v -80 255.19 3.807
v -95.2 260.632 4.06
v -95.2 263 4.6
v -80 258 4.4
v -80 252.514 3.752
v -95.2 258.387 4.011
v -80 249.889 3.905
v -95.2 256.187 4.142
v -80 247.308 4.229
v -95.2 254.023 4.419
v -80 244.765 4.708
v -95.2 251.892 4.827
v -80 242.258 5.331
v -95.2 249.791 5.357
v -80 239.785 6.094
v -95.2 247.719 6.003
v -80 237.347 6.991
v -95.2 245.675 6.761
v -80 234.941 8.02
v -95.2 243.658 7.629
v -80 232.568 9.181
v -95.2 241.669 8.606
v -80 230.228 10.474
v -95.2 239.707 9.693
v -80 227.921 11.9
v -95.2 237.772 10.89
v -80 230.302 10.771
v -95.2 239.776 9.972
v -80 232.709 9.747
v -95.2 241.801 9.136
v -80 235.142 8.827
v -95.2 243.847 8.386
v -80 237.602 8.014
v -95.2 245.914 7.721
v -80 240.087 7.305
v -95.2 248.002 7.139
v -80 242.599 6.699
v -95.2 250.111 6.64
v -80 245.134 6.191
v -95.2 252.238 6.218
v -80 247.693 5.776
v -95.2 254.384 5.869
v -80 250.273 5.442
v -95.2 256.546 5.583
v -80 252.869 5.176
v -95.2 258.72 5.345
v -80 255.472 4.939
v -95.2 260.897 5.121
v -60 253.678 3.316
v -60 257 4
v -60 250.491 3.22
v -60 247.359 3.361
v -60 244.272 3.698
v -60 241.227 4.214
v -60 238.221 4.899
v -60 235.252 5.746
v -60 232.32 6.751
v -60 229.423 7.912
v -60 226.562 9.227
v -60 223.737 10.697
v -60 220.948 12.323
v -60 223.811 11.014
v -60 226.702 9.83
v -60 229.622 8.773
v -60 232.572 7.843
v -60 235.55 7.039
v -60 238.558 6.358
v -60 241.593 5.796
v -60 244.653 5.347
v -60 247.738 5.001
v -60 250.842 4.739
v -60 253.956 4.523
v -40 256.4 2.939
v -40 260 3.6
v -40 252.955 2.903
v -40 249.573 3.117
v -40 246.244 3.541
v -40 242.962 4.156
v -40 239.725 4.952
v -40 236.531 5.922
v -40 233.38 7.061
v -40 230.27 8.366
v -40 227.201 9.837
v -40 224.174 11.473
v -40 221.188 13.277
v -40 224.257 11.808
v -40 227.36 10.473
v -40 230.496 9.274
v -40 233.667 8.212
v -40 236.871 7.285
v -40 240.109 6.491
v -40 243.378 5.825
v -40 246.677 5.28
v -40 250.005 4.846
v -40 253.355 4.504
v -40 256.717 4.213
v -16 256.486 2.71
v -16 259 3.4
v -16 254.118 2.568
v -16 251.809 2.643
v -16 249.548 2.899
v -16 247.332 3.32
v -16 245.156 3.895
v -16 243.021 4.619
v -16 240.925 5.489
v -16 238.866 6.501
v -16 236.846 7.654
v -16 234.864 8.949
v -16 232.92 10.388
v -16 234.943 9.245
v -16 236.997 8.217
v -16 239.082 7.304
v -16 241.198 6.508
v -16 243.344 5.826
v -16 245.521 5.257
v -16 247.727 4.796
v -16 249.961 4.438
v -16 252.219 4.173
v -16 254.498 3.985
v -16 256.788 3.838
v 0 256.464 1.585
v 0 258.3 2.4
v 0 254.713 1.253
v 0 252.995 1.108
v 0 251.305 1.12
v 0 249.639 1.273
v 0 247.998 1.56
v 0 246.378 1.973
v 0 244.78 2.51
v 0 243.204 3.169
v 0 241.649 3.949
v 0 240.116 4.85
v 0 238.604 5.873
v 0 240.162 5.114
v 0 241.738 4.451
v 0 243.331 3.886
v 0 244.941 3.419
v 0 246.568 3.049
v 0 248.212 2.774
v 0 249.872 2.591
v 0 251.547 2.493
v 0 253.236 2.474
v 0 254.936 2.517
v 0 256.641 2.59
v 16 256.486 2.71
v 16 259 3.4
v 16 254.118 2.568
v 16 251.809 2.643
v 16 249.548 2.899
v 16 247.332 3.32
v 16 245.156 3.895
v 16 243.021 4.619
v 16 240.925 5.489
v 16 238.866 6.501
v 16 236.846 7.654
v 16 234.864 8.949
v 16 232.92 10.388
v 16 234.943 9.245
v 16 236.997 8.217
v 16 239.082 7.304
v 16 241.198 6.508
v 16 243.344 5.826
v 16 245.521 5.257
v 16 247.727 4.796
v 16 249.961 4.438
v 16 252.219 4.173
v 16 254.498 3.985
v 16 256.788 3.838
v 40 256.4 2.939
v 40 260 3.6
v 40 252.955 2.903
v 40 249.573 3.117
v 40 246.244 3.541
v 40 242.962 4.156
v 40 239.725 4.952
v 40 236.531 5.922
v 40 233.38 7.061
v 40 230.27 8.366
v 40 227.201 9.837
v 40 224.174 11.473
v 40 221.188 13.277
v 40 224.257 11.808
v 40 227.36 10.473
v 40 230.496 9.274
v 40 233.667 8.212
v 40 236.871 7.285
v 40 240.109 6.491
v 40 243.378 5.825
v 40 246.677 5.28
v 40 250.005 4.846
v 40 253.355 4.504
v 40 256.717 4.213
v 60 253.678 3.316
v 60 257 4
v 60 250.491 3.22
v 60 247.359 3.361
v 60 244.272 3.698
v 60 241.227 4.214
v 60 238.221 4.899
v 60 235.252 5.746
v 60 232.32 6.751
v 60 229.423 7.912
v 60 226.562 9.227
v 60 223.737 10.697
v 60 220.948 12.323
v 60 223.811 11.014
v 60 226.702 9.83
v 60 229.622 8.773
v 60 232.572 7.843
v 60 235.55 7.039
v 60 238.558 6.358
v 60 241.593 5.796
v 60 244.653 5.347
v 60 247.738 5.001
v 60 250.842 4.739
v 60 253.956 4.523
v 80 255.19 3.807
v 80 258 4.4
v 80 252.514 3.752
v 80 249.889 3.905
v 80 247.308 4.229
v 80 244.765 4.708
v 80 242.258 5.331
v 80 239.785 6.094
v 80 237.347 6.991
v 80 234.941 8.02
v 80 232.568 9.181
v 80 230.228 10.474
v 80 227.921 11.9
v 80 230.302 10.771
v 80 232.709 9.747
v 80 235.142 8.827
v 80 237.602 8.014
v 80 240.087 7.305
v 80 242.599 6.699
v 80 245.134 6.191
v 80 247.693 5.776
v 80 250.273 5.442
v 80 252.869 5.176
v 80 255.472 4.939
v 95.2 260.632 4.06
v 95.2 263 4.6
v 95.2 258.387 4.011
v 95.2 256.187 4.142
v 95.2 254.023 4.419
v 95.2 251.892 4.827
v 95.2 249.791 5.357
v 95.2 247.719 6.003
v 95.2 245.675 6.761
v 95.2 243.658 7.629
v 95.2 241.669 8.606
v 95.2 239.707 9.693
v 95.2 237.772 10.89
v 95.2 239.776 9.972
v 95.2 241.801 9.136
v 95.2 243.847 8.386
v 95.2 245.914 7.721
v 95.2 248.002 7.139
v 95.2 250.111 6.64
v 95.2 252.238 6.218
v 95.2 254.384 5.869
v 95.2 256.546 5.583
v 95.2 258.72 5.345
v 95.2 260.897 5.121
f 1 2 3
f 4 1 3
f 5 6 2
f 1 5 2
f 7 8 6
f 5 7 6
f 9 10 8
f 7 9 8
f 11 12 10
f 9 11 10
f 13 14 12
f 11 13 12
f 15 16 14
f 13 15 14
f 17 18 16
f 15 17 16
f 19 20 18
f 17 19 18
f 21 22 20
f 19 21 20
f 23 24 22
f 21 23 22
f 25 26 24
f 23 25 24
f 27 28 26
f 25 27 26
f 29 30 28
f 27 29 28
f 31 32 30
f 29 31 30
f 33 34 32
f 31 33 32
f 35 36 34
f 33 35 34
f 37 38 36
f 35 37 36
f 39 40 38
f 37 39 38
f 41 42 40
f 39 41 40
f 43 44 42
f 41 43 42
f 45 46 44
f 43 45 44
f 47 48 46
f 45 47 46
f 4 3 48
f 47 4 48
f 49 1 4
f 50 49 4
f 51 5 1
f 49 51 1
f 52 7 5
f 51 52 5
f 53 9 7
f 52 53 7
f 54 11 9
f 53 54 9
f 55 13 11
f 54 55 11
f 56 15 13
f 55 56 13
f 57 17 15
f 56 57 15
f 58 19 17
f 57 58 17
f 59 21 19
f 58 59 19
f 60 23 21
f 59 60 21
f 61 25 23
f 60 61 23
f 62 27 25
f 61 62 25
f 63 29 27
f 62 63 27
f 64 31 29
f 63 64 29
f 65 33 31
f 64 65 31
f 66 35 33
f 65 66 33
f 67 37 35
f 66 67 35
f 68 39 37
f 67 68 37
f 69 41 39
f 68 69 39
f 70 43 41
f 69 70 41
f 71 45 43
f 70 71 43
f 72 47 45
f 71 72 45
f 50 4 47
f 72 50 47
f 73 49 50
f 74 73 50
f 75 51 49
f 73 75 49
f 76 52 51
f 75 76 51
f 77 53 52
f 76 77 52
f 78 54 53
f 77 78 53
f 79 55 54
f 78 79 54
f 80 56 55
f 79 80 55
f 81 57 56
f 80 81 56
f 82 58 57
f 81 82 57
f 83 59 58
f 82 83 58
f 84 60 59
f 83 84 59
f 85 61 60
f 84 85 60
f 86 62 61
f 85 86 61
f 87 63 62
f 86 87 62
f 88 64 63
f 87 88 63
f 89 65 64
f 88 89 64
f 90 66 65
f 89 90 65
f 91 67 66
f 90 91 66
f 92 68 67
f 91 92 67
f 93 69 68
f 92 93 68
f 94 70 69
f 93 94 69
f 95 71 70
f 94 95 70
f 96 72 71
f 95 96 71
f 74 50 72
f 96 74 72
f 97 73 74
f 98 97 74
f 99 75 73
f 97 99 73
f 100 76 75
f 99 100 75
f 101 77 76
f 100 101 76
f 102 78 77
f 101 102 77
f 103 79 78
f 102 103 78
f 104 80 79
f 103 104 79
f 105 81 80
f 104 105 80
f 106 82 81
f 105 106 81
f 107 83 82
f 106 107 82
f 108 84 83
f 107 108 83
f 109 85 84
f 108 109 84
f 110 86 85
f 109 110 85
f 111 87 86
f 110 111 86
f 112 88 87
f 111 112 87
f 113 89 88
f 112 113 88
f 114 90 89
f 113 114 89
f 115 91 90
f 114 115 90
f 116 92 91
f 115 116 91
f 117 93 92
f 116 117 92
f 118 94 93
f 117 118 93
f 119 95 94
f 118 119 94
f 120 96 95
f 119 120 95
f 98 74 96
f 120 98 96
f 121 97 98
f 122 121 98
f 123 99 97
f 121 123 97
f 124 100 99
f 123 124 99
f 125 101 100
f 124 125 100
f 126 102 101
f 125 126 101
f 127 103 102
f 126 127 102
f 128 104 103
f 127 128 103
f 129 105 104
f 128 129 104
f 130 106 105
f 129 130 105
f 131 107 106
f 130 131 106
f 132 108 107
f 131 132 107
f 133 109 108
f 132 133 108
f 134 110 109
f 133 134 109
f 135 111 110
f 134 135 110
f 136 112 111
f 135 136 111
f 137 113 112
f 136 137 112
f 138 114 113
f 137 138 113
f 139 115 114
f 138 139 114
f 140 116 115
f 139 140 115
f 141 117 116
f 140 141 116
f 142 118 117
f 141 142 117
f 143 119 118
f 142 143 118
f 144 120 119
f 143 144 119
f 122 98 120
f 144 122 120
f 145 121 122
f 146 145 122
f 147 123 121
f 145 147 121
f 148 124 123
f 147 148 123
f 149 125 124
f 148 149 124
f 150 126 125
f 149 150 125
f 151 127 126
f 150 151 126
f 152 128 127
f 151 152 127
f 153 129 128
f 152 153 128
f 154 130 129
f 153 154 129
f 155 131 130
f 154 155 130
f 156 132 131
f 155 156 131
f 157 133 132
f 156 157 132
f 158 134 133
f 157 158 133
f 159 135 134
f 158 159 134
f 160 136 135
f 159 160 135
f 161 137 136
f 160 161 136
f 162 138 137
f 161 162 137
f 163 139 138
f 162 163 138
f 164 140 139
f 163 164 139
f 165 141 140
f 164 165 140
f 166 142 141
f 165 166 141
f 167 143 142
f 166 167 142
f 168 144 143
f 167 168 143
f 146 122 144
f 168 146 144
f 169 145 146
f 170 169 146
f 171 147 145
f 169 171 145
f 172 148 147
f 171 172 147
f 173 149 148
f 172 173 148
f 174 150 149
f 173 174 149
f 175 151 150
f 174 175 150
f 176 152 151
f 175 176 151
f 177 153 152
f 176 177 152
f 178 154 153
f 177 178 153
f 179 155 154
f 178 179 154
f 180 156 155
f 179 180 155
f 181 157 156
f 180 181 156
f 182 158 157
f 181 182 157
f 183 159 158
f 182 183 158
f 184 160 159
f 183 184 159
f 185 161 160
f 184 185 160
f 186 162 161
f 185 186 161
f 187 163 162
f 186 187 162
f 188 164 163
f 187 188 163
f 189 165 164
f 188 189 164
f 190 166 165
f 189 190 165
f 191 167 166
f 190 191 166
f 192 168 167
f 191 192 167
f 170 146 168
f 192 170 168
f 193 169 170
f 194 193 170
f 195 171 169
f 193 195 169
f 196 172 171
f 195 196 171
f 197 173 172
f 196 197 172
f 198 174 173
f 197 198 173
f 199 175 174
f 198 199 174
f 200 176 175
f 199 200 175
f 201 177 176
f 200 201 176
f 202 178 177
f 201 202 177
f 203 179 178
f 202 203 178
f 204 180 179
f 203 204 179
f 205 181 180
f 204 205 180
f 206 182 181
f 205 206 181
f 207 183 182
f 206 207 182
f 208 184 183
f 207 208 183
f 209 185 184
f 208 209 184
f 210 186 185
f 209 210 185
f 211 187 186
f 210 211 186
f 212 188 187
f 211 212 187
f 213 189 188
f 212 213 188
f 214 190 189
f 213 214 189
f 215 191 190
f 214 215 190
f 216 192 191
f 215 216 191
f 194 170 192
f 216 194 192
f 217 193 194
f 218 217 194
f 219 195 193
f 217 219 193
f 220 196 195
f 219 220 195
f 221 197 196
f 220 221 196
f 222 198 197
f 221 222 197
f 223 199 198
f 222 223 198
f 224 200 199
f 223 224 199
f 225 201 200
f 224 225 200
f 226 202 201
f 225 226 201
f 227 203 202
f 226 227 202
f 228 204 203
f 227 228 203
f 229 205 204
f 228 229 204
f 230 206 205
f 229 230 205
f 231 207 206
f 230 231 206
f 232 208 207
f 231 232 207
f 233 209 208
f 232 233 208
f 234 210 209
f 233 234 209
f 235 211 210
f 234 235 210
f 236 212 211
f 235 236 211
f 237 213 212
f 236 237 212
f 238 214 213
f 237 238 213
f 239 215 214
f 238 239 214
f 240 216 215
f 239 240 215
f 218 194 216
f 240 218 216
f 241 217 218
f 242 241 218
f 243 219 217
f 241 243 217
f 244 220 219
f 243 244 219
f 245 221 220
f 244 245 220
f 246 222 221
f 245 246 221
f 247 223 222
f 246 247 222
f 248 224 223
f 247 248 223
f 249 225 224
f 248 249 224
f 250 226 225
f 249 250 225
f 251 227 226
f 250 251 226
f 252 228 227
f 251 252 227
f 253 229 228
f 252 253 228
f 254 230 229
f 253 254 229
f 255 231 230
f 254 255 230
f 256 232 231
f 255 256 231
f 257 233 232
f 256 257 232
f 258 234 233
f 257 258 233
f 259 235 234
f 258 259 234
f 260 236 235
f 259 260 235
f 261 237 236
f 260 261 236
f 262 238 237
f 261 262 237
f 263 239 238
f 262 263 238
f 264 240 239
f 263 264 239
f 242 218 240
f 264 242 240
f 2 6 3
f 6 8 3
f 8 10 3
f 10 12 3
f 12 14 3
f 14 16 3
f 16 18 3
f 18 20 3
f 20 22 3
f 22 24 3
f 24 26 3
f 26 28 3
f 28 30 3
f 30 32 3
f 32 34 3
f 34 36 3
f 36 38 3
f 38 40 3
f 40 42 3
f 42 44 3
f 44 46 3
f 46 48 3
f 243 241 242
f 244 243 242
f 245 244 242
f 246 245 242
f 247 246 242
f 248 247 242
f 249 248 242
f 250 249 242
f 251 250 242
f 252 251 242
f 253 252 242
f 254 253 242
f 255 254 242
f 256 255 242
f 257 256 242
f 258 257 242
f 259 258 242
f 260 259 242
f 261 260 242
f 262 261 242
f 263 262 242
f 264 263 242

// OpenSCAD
// file: ../lib.scad
// ===== 공용 프리미티브 (params 의존 없음 — use로 포함. 함정 1) =====

// 두 점을 잇는 캡슐. 끝단이 od/2 만큼 뻗는다 (함정 3)
module rod(p1, p2, od, fn = 56)
    hull() { translate(p1) sphere(d = od, $fn = fn);
             translate(p2) sphere(d = od, $fn = fn); }

function mir(p, s = 1) = [s * p.x, p.y, p.z];

// --- 라운디드 사각 2D 폴리곤 (CCW) ---
function arc_pt(cx, cy, r, a) = [cx + r * cos(a), cy + r * sin(a)];
function rrpts(w, h, r, n = 4) =
    let (x = w / 2 - r, y = h / 2 - r)
    concat(
        [for (i = [0:n]) arc_pt( x, -y, r, -90 + 90 * i / n)],
        [for (i = [0:n]) arc_pt( x,  y, r,   0 + 90 * i / n)],
        [for (i = [0:n]) arc_pt(-x,  y, r,  90 + 90 * i / n)],
        [for (i = [0:n]) arc_pt(-x, -y, r, 180 + 90 * i / n)]);

// y 위치의 XZ 단면 슬래브 (중심 x0/zc, 폭 w/높이 h, 모서리 r).
// 회전 매핑: 2D x→차량 X, 2D y→차량 Z, 돌출 +z→−Y (y..y+0.02 전방 전용, 함정 20)
module slabr(y, x0, w, h, zc, r)
    translate([x0, y + 0.02, zc]) rotate([90, 0, 0])
        linear_extrude(0.02) polygon(rrpts(w, h, r));

// 단면 체인 loft: sec = [[y, x0, w, h, zc, r], ...]
module loftr(sec)
    for (i = [0 : len(sec) - 2])
        hull() {
            slabr(sec[i][0],     sec[i][1],     sec[i][2],     sec[i][3],     sec[i][4],     sec[i][5]);
            slabr(sec[i + 1][0], sec[i + 1][1], sec[i + 1][2], sec[i + 1][3], sec[i + 1][4], sec[i + 1][5]);
        }

// 라운디드 박스 (z0..z1 수직, 평면 모서리 r)
module rbox(xc, yc, z0, z1, dx, dy, r, fn = 32)
    hull() for (px = [-1, 1], py = [-1, 1])
        translate([xc + px * (dx / 2 - r), yc + py * (dy / 2 - r), z0])
            cylinder(r = r, h = z1 - z0, $fn = fn);

// --- NACA 계열 에어포일 (LE 원점, 2D +x = 현 방향) ---
function _yt(x, c, t) = 5 * t * c * (0.2969*sqrt(x) - 0.1260*x - 0.3516*x*x
    + 0.2843*x*x*x - 0.1036*x*x*x*x);
function _yc(x, c, m) = 4 * m * c * x * (1 - x);
function naca_pts(c, t, m, n = 12) =
    concat(
        [for (i = [0:n])     let (x = i / n)     [x*c,  _yt(x, c, t) + _yc(x, c, m)]],
        [for (i = [n-1:-1:0]) let (x = i / n)    [x*c, -_yt(x, c, t) + _yc(x, c, m)]]);

// 슬라이스 3D 링: v=[x, yle, zle, c, aoa, th, cam] → 받각 회전된 naca 점의 링
// (th/cam은 mm — 현 대비 비율로 정규화)
function wring(v, n = 12) =
    let (c = v[3], t = v[5] / c, m = v[6] / c, pts = naca_pts(c, t, m, n),
         ca = cos(v[4]), sa = sin(v[4]))
    // 코드 방향 (ca,sa) + 두께/캠버 수직 방향 (-sa,ca) — 2D y 누락 금지
    [for (p = pts) [v[0], v[1] + p[0] * ca - p[1] * sa, v[2] + p[0] * sa + p[1] * ca]];

// 진짜 로프트 윙 — polyhedron 스트립. hull 체인은 캠버진 하면을 볼록 껍질로
// 채워(LE→TE 직선 웨지) 요소가 처지므로 쓰지 않는다
module wing3(sl, n = 12) {
    rings = [for (v = sl) wring(v, n)];
    ns = len(rings);
    m = len(rings[0]);
    pts = [for (r = rings, p = r) p];
    function ix(i, k) = i * m + (k % m);
    faces = concat(
        // 측면 스트립 (사중면 → 삼각형 2) — 외향 노멀 권선(캡과 일치)
        [for (i = [0 : ns - 2], k = [0 : m - 1])
            each [[ix(i, k), ix(i, k + 1), ix(i + 1, k + 1)],
                  [ix(i, k), ix(i + 1, k + 1), ix(i + 1, k)]]],
        // 끝 캡 (링은 단순 폴리곤 — 팬 삼각분할)
        [for (k = [1 : m - 2]) [ix(0, 0), ix(0, k + 1), ix(0, k)]],
        [for (k = [1 : m - 2]) [ix(ns - 1, 0), ix(ns - 1, k), ix(ns - 1, k + 1)]]
    );
    polyhedron(points = pts, faces = faces, convexity = 4);
}

// 반쪽 슬라이스 → x-대칭 전체. 규약: half는 센터(x=0)→팁 순서(내림차순 x).
// 결과는 x 오름차순 체인. x=0 센터만 중복 제외 (그 외 전부 미러)
function wsym(half) =
    concat([for (i = [len(half) - 1 : -1 : 0]) half[i]],
           [for (i = [0 : len(half) - 1]) if (abs(half[i][0]) > 1e-9)
               concat([-half[i][0]], [for (j = [1 : len(half[i]) - 1]) half[i][j]])]);

// 환(링), 축 Z
module ann(r_in, r_out, h, fn = 96)
    difference() { cylinder(r = r_out, h = h, center = true, $fn = fn);
                   cylinder(r = r_in,  h = h + 2, center = true, $fn = fn); }

// 리스트 전체 x반전+순서 역행 (센터 구간 없는 플랩 등 — 좌우 별도 wing3 호출용).
// x반전만 하면 행렬식이 음수가 되어 권선이 뒤집힌다 → 순서 역행으로 상쇄
function msym(half) =
    [for (i = [len(half) - 1 : -1 : 0])
        concat([-half[i][0]], [for (j = [1 : len(half[i]) - 1]) half[i][j]])];
// file: ../params.scad
// =====================================================================
// F1 그랜드파이언스 카 1:10 — 전체 파라미터 (유일한 수정 지점)
// 좌표계: +Y 전방, +X 좌측, +Z 상방, 지면 z=0, 원점=휠베이스 중심
// 전장 558 (y -268..+278), 전폭 194, 휠베이스 360, 타이어 OD 72 (720mm)
// 30부품. loftr 단면 = [y, x0, w, h, zc, r] (XZ 단면, y..y+0.02 슬래브)
// wing3 슬라이스 = [x, yle, zle, c, aoa, th, cam]
//   aoa: 현 방향의 X축 회전각. 전방 받각 요소는 165~170 (TE가 뒤+위)
// =====================================================================
$fn = 96;

// -- 휠/액슬 (실차 720mm 타이어, 18인치 림, 트랙 F1600/R1550) --
AXF_Y = 180;   AXR_Y = -180;
WHF_X = 80;    WHR_X = 77.5;
WH_Z  = 36;
TIRF_W = 30.5; TIRR_W = 40.5;  TIR_R = 36;
TIR_FN = 288;                 // 타이어 회전체 해상도
RIM_R = 23.2;  RIM_T = 1.0;   // 림 배럴 반경/두께
RIM_LF = 12.4; RIM_LR = 17.4; // 림 배럴 반폭
HUB_BORE = 7.0; STUB_D = 6.2; // 방사 간극 0.4
DISC_R = 15.5;                // 브레이크 디스크

// -- 바디 공통 레벨 --
FLO_Z0 = 2.0;  FLO_Z1 = 5.5;  // 플로어 (두께 3.5)
BOD_Z0 = 5.65;                // 샤시/카버/기어박스 바닥 (플로어 위 0.15)
J = 0.15;                     // 부품 접합 기본 간극
ARM_OD = 3.4;                 // 서스펜션 암 캡슐 직경

// ===== 01 플로어 =====
FLOOR_SEC = [
    [132,    0,  92, 3.5, 3.75, 1.5], [100, 0, 118, 3.5, 3.75, 1.5],
    [60,     0, 130, 3.5, 3.75, 2.0], [10,  0, 132, 3.5, 3.75, 2.0],
    [-60,    0, 128, 3.5, 3.75, 2.0], [-120, 0, 112, 3.5, 3.75, 2.0],
    [-161.85, 0, 100, 3.5, 3.75, 2.0]];

// ===== 02 디퓨저 (램프 + 스트레이크는 부품 내부) =====
DIFF_SEC = [
    [-230,   0, 100, 10.0, 11.0, 1.5], [-215, 0, 100, 8.0,  9.0, 1.5],
    [-190,   0, 100,  6.0,  6.2, 1.5], [-162.0, 0, 100, 4.0, 4.15, 1.5]];
DIFF_TOP = [[-175, 7.8], [-205, 11.9], [-228, 15.6]];  // (y, 램프 상면 z)

// ===== 03 플로어 에지 윙 =====
FEW_SEC = [   // [y, x0, w, h, zc, r] — x0 부호로 좌우
    [55,   63.5, 3.0, 2.0, 6.65, 1.0], [-5,  65.5, 3.0, 5.5, 8.40, 1.5],
    [-70,  63.0, 3.0, 4.0, 7.65, 1.5], [-120, 58.0, 3.0, 3.0, 7.15, 1.5]];
FEW2_SEC = [
    [100, 57.0, 2.5, 1.5, 6.40, 0.8], [60, 60.0, 2.5, 2.0, 6.65, 0.8]];

// ===== 04 노우즈 =====
NOSE_SEC = [
    [95,   0, 38, 28, 25.3, 12], [100,  0, 38, 29, 25.3, 12],
    [115,  0, 36, 28, 23.8, 11], [135,  0, 31, 24, 21.3,  9],
    [160,  0, 27, 20, 18.3,  8], [185,  0, 23, 17, 15.8,  7],
    [205,  0, 20, 15, 14.3,  6], [224,  0, 17, 12, 12.3,  5],
    [242,  0, 14,  9, 10.8,  4], [258,  0, 10,  7, 10.1,  3],
    [272,  0,  4.5, 4.5, 9.8, 2], [273.5, 0, 1.2, 1.2, 9.8, 0.6]];

// ===== 05 샤시(모노코크) + 콕핏 컷 =====
CHAS_SEC = [
    [-34.85, 0, 46, 44, 27.65, 15], [-10, 0, 48, 46, 28.65, 15],
    [20,     0, 48, 44, 27.65, 15], [60,  0, 46, 40, 25.65, 14],
    [94.85,  0, 42, 34, 22.65, 12]];
CKP_CUT = [[62, 0, 34, 32, 46, 3], [-30, 0, 34, 30, 45, 3]];

// ===== 06 엔진 커버 + 샤크핀 =====
COV_SEC = [
    [-152,   0,  8, 14, 35.65,  6], [-140, 0, 12, 18, 32.65,  7],
    [-120,   0, 18, 24, 29.65,  9], [-95,  0, 26, 30, 26.15, 11],
    [-70,    0, 34, 36, 25.65, 13], [-50,  0, 40, 40, 25.65, 14],
    [-35.15, 0, 44, 42, 26.65, 15]];
FIN_SEC = [
    [-162, 0, 2.2, 44, 62.0, 1], [-120, 0, 2.5, 30, 56.0, 1],
    [-92.2, 0, 2.5, 10, 45.0, 1]];

// ===== 07 에어박스 (험프 + 인테이크 링) =====
ABX_SEC = [
    [-92, 0, 14, 17, 50.00, 6], [-68, 0, 20, 24, 56.60, 8],
    [-46, 0, 22, 26, 59.60, 8], [-34, 0, 22, 13, 56.30, 6]];
ABX_RING_C = [0, -45, 73.5];  ABX_RING_R = 11;  ABX_RING_T = 4.5;
ABX_RING_SZ = 0.72;

// ===== 08 사이드포드 (x0=±41.5) =====
SPOD_X0 = 41.5;
SPOD_SEC = [   // [y, w, h, zc, r]
    [38,   34, 26, 18.65, 8], [5,   34, 28, 19.65, 9], [-25,  34, 26, 18.65, 9],
    [-55,  32, 21, 18.15, 8], [-80, 30, 15, 17.15, 8], [-100, 26,  9, 16.15, 7]];
SPOD_INLET = [24, 18, 19, 2.3];  // 컷: w, h, zc, 깊이

// ===== 09 할로 =====
HALO_N = 28;  HALO_OD = 9;
HALO_RX = 22; HALO_RY = 44; HALO_CY = 12;  // 타원 계획면(평면도)
HALO_Z0 = 75; HALO_ZA = 2;                 // z(t) = Z0 + ZA*cos(t)

// ===== 10/11/12/13 프런트 윙 =====
FW_MAIN_HALF = [   // 반쪽(x≤0) — wsym()로 전체화
    [0,    258.3, 2.4, 20, 170, 1.4, 2.0],
    [-16,  259.0, 3.4, 27, 165, 1.6, 2.4],
    [-40,  260.0, 3.6, 40, 166, 1.8, 2.8],
    [-60,  257.0, 4.0, 37, 167, 1.7, 2.6],
    [-80,  258.0, 4.4, 31, 166, 1.6, 2.2],
    [-95.2, 263.0, 4.6, 26, 166, 1.5, 1.8]];
FW_F1_HALF = [
    [-16,  253.0, 8.0, 22, 155, 1.3, 4.0],
    [-40,  250.5, 8.2, 26, 156, 1.4, 4.2],
    [-60,  249.5, 8.4, 26, 157, 1.4, 4.2],
    [-80,  250.0, 8.6, 24, 158, 1.4, 4.0],
    [-95.2, 254.0, 8.8, 21, 158, 1.3, 3.5]];
FW_F2_HALF = [
    [-16,  258.0, 12.4, 17, 147, 1.2, 4.5],
    [-40,  255.5, 12.6, 20, 148, 1.3, 4.8],
    [-60,  254.5, 12.8, 20, 149, 1.3, 4.8],
    [-80,  254.5, 13.0, 19, 150, 1.3, 4.5],
    [-95.2, 258.0, 13.2, 17, 150, 1.2, 4.0]];
FW_EP_X = 96.3;  FW_EP_T = 1.5;   // 엔드플레이트 x 중심/두께
FW_EP_PTS = [    // (y,z) 아웃라인
    [226, 1.5], [266, 1.5], [266, 8], [263, 24.5], [252, 24.5],
    [244, 17], [233, 15], [226, 9]];
FW_MT_SEC = [   // 마운트 플레이트 [y, x0(±2.6), w, h, zc, r] — 노우즈 저면 라운딩 회피
    [244, 2.6, 1.6, 1.8, 5.25, 0.5], [250, 2.6, 1.6, 1.8, 5.25, 0.5]];

// ===== 14 리어 윙 =====
RW_MAIN = [
    [-50.8, -212, 57.5, 46, 162, 2.2, -3.5], [-25, -211, 56.6, 47, 162, 2.3, -4.0],
    [0,     -210, 54.2, 47, 162, 2.3, -4.0], [25,  -211, 56.6, 47, 162, 2.3, -4.0],
    [50.8,  -212, 57.5, 46, 162, 2.2, -3.5]];
RW_FLAP = [
    [-49.6, -234,   71.8, 30, 155, 1.8, -4.5],
    [0,     -235.5, 73.0, 30, 155, 1.8, -4.5],
    [49.6,  -234,   71.8, 30, 155, 1.8, -4.5]];
RW_EP_X = 52;  RW_EP_T = 2;
RW_EP_PTS = [
    [-200, 46], [-268, 46], [-268, 60], [-262, 93], [-250, 93],
    [-243, 72], [-218, 64], [-202, 74]];
RW_DRS = [-245, 79.4, 5.0, 2.6, 3.0];   // 팟: y, z, w, h, 두께

// ===== 15 빔 윙 =====
BEAM_E1 = [
    [-50.9, -204.5, 31.5, 16, 162, 1.8, -2.5], [0, -205.5, 30.4, 16, 162, 1.8, -2.5],
    [50.9,  -204.5, 31.5, 16, 162, 1.8, -2.5]];
BEAM_E2 = [
    [-50.9, -210, 36.8, 15, 158, 1.6, -3.0], [0, -211, 35.6, 15, 158, 1.6, -3.0],
    [50.9,  -210, 36.8, 15, 158, 1.6, -3.0]];
BEAM_PLATE = [-214, -200.15, 8.2, 22, 31];  // 마운트 플레이트 y1,y0,x반폭,z0,z1

// ===== 16 리어윙 파일론(쌍둥 스완넥) =====
RW_PYL = [[-158, 55.0], [-190, 58.0], [-212.5, 63.0]];  // (y, z), x=±5.4
RW_PYL_X = 5.4;  RW_PYL_OD = 8;

// ===== 17 미러 =====
MIR_BASE = [14, 63, 46.0];  MIR_HOUSE = [31, 66, 56.5];

// ===== 18 헬멧 =====
HELM_C = [0, 0, 55];  HELM_R = 11.5;
HELM_SC = [1, 1.18, 1.02];

// ===== 19 콕핏 트림 =====
SEAT_SEC  = [[30, 0, 26, 13.2, 36.75, 3], [-10, 0, 26, 13.2, 36.75, 3]];
HREST_SEC = [[12, 0, 32, 15, 53.5, 5], [-20, 0, 32, 15, 53.5, 5]];

// ===== 20 스티어링 휠 =====
SW_C = [0, 40, 47];  SW_TILT = 20;

// ===== 21/22 서스펜션 (픽업=[x, y, z], 암 끝은 업라이트 내부) =====
FUP = [61, 183, 46];  FLO_BALL = [61.5, 181, 24];  FTR = [61.5, 177, 35];
FPU = [61.5, 180, 27];
F_ARM = [   // [픽업, 볼]
    [[12.0, 206, 20.0], FUP],  [[16.0, 152, 23.0], FUP],
    [[11.9, 208,  9.3], FLO_BALL], [[16.3, 150, 12.0], FLO_BALL],
    [[15.6, 162, 14.0], FTR]];
F_PUSH = [[11.8, 198, 24.4], FPU];
RUP = [53.5, -182, 46];  RLO = [54, -179, 23];  RDRIVE_O = [52, -180, 31];
R_ARM = [
    [[13.3, -160, 47.0], RUP], [[13.3, -198, 45.0], RUP],
    [[12.8, -158, 20.4], RLO], [[9.2, -202, 19.6], RLO]];
R_PULL = [[12.6, -177, 23.75], [53.5, -181, 44]];
R_DRIVE = [[13.2, -180, 17.0], RDRIVE_O];

// ===== 23/24 브레이크 스쿱 =====
SCOOP_F = [[164.2, 59.5, 7, 11, 30, 3], [158, 58.5, 5.5, 8, 28.5, 2.5]];
SCOOP_R = [[-164.2, 48, 7, 10, 29, 3], [-158, 46, 5, 7.5, 27.5, 2.5]];

// ===== 25~28 타이어/림 =====
TIRE_BEAD = 2.6;   // 비드 안쪽 세팅 (단면 반경 23.4)

// ===== 29 기어박스 + 리어 크래시 =====
GEAR_SEC = [
    [-258,   0,  4,  1.8, 15.00, 1.5], [-252, 0,  6,  1.6, 16.30, 2],
    [-230,   0,  9,  1.4, 18.30, 3],   [-208, 0, 12,  4.9, 15.05, 4],
    [-195,   0, 16,  9.35, 14.83, 5],   [-170, 0, 20, 15.1, 15.45, 6],
    [-145,   0, 22, 15.95, 13.60, 7],  [-117.85, 0, 26, 8.6,  9.95, 8]];
GEAR_TOWER = [-200, -158, 8, 11.3, 28, 50];  // y1,y0,x내측,x외측,z0,z1
RAIN_LT = [-258.6, 5, 4];   // y면, w, h

// ===== 30 카메라/안테나 =====
TCAM_Y = -45;  TCAM_Z0 = 84.8;
SIDECAM = [[194, 19.0], [202, 18.5]];  // (y, z) — x는 노우즈 반폭+0.15
ANT = [[4, 70], [-4, 70]];             // (x, y) — chassis 탑
// main file
// 10 프런트 윙 메인 플레인 — 풀스팬 (중립 센터 + 타이어 주변 스윕)
include <../params.scad>
use <../lib.scad>

module fw_main() wing3(wsym(FW_MAIN_HALF));

fw_main();
